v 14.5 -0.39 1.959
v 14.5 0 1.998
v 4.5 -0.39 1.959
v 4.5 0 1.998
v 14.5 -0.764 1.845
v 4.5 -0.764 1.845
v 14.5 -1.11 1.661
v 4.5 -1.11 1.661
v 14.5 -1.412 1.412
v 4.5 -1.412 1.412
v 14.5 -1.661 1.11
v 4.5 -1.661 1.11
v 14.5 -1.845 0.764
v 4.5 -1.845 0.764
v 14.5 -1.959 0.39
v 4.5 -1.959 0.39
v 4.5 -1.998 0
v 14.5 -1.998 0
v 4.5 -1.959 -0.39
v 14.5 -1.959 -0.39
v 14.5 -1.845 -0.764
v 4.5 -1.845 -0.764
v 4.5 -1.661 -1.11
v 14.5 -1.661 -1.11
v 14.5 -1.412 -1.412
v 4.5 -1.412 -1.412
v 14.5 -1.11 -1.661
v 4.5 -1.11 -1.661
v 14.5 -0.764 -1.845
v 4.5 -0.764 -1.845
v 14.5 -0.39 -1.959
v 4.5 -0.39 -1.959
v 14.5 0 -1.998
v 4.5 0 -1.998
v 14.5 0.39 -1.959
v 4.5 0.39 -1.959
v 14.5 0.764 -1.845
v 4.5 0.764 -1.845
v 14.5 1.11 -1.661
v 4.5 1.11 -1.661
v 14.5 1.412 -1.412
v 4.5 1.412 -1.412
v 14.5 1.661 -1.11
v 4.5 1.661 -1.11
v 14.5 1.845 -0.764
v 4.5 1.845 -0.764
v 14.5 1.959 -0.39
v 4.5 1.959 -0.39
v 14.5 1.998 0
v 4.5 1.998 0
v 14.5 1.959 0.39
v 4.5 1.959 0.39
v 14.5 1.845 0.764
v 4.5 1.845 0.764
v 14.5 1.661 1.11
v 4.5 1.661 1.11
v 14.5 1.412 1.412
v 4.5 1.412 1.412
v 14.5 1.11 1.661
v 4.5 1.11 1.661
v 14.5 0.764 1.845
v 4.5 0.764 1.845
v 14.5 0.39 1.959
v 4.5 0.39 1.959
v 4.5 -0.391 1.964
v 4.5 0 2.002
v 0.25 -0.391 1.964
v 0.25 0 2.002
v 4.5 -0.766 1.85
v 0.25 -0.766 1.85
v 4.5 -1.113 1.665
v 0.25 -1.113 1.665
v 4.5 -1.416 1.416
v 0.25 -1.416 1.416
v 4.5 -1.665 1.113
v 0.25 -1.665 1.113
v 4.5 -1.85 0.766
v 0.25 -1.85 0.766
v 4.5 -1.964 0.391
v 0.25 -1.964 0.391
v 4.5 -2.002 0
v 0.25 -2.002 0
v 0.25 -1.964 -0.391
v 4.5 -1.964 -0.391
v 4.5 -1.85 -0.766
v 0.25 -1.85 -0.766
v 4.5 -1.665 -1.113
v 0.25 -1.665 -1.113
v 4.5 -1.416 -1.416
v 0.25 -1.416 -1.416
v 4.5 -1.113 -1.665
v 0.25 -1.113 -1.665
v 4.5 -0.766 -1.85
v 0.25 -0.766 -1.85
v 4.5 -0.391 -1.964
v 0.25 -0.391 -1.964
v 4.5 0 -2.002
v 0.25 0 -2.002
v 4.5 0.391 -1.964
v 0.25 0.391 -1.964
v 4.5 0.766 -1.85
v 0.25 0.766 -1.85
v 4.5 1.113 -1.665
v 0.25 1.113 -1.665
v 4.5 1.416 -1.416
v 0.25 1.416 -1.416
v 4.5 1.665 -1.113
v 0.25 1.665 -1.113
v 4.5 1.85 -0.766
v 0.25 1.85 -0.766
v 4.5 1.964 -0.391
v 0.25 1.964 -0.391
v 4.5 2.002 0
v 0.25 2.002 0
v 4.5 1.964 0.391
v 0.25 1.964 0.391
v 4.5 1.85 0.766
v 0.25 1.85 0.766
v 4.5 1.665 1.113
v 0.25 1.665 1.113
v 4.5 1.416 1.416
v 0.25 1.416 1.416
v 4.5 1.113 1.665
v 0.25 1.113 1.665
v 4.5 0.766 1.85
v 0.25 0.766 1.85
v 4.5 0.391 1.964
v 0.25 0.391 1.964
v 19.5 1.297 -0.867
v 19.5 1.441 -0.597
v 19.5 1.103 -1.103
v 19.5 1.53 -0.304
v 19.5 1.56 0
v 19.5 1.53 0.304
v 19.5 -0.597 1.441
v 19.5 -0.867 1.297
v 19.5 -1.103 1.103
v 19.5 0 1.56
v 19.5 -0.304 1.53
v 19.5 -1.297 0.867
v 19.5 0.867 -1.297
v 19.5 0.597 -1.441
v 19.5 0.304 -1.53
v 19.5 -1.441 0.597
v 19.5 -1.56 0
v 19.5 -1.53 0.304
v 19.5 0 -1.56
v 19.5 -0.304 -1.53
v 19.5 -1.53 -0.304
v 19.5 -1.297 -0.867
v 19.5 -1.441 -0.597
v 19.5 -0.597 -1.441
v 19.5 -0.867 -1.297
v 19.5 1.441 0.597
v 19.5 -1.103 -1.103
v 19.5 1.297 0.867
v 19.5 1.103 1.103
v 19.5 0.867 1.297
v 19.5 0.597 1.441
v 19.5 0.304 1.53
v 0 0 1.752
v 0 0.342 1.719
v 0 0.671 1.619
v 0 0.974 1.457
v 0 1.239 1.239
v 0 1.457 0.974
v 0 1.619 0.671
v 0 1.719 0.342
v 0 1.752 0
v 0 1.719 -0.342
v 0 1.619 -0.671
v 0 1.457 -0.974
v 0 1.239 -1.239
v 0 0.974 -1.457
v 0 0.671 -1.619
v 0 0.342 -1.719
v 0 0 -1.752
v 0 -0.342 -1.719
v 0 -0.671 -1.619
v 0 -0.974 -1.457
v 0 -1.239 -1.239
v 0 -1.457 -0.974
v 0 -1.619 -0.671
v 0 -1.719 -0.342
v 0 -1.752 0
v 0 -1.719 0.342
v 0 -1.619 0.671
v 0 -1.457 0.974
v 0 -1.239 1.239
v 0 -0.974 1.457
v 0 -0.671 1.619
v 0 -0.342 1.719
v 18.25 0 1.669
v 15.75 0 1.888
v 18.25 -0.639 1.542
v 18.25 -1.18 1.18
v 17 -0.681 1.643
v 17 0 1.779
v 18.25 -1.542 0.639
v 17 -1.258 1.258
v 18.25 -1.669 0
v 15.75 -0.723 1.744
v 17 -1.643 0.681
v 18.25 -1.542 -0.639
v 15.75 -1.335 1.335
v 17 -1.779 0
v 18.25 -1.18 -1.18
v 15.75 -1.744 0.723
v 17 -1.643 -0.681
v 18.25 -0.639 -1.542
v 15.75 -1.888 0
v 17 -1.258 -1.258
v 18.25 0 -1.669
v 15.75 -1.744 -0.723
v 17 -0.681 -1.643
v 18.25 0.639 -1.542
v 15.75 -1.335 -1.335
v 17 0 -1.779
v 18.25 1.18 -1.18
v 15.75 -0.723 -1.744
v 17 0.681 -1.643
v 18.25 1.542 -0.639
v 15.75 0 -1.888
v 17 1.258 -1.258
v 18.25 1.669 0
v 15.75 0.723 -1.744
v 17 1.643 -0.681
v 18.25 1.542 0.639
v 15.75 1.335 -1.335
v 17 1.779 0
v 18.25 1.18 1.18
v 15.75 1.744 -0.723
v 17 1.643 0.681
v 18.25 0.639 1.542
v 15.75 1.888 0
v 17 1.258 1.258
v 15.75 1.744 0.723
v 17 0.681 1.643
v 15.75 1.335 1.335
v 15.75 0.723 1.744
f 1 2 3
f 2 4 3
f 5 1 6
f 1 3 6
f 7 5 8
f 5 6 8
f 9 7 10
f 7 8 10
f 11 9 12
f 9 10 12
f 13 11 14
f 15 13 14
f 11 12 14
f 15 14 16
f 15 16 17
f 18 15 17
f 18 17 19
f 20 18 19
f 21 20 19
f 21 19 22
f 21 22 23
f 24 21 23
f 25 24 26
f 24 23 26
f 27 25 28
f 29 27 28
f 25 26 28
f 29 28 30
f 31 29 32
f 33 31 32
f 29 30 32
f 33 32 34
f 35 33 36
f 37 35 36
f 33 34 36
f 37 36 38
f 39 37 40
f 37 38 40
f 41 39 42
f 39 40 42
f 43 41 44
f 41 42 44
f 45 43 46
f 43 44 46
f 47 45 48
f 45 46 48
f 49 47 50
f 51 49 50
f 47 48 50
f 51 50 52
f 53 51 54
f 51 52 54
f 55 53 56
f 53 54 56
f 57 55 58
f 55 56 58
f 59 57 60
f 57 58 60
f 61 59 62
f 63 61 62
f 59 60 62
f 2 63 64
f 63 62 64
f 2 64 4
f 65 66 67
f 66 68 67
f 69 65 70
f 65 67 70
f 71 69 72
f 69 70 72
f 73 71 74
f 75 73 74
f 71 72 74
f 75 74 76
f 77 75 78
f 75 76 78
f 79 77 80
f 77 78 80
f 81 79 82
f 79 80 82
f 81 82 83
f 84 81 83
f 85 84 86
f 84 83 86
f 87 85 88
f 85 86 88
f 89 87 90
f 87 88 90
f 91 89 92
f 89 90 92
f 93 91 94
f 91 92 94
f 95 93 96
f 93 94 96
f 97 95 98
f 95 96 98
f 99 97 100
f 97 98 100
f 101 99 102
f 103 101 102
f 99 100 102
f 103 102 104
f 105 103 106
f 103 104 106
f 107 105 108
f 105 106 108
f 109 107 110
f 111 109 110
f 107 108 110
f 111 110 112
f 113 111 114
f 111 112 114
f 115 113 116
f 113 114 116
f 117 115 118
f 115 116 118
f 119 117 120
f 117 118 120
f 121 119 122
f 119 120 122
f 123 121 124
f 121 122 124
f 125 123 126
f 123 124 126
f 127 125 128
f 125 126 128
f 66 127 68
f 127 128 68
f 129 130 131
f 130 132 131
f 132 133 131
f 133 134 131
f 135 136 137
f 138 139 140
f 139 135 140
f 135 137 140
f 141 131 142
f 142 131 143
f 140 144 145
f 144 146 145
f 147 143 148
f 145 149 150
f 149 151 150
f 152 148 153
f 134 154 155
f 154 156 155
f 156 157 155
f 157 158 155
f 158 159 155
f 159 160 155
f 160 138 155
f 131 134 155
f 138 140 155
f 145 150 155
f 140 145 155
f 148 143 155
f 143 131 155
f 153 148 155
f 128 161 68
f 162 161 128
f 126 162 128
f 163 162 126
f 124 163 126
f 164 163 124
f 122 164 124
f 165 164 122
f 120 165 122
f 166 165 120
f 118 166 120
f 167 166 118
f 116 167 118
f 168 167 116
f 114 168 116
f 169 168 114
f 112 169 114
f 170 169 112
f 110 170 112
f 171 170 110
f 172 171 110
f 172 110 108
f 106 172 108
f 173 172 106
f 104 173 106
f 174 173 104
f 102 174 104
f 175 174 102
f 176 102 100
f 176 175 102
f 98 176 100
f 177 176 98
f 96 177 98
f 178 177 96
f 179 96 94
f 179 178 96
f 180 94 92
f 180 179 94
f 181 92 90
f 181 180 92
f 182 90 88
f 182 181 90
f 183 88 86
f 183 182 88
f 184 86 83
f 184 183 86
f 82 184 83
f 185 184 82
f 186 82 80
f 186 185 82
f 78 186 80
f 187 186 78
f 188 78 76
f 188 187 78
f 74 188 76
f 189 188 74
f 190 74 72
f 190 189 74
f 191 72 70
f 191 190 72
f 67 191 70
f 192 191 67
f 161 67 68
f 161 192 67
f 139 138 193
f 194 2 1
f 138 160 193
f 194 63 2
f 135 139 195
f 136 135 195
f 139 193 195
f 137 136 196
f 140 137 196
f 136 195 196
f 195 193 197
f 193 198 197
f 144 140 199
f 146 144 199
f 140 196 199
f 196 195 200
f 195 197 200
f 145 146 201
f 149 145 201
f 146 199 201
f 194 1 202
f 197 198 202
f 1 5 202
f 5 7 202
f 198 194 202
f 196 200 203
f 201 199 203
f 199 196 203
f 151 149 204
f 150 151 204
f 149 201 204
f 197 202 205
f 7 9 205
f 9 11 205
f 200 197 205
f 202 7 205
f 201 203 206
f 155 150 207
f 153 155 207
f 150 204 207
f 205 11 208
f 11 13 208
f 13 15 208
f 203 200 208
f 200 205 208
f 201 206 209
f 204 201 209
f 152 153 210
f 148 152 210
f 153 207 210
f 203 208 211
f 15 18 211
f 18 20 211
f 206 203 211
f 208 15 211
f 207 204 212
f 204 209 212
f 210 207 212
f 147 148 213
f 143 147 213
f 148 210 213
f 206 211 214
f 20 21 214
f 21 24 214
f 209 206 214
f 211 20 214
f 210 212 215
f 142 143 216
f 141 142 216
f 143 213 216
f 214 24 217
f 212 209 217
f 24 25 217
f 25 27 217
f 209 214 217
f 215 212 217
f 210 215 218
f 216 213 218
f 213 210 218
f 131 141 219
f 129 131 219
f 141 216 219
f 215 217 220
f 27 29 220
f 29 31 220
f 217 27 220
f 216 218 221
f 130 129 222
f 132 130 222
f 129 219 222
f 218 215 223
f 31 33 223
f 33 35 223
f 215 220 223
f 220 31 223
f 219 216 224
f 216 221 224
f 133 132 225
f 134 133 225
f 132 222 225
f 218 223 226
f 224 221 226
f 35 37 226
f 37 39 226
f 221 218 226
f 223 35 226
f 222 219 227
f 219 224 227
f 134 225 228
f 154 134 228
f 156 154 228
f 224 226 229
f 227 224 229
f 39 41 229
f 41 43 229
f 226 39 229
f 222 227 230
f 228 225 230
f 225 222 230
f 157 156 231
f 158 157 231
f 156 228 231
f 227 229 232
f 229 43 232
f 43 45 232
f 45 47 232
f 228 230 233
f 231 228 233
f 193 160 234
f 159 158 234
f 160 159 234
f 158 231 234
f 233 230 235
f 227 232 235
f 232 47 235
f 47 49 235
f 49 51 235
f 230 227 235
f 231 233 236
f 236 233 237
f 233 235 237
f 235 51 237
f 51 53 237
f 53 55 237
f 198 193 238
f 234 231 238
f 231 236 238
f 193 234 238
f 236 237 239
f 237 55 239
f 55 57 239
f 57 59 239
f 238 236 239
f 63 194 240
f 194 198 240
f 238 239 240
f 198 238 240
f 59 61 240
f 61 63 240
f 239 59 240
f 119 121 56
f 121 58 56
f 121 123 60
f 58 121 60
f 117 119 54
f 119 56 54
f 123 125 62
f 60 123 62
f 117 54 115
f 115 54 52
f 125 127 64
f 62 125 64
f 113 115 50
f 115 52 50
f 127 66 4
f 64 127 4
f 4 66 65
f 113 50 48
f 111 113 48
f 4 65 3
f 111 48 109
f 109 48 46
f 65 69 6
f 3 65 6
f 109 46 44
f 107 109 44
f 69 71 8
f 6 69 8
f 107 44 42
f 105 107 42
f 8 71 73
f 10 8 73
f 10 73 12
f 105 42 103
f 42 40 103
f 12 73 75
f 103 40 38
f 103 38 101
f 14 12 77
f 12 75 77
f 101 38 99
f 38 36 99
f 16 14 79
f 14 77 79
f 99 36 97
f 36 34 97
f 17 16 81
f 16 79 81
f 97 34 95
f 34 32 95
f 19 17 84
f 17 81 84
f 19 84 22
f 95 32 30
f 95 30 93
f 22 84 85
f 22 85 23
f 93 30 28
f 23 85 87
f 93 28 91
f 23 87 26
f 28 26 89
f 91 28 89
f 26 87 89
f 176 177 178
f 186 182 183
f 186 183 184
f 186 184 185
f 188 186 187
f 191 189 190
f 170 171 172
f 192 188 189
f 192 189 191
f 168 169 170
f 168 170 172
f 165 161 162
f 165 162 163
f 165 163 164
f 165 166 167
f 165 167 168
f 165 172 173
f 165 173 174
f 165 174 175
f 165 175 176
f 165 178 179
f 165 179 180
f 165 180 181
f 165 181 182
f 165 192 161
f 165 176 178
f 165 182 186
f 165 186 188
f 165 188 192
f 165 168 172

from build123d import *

# Parameters (mm, degrees)
FILLET1_R = 0.25


with BuildPart() as part:
    # Sketch1 → Revolve1 (revolve)
    with BuildSketch(Plane.XY, mode=Mode.PRIVATE) as revolve1_sk:
        Polygon((0, 2.0025), (0, 3.5), (-1, 3.5), (-1, 0), (19.5, 0), (19.5, 1.560056682), (14.5, 1.9975), (4.5, 1.9975), (4.5, 2.0025), align=None)
    revolve(revolve1_sk.sketch.rotate(Axis((-30.167084044, 0, 0), (1, 0, 0)), 90), axis=Axis((-30.167084044, 0, 0), (1, 0, 0)))  # turned: the seam where the file's is

    # Fillet1
    fillet1_edges = [part.edges().sort_by_distance(p)[0] for p in [
        (0, 0, -2.0025),
    ]]
    fillet(fillet1_edges, radius=FILLET1_R)

    # Sketch2 → Cut-Revolve1 (revolve, cut)
    with BuildSketch(Plane.XY, mode=Mode.PRIVATE) as cut_revolve1_sk:
        Polygon((0.25, 2.0025), (0, 1.7525), (0, 0), (-1, 0), (-1, 3.5), (0, 3.5), align=None)
    revolve(cut_revolve1_sk.sketch.rotate(Axis((0, 0, 0), (-1, 0, 0)), 270), axis=Axis((0, 0, 0), (-1, 0, 0)), mode=Mode.SUBTRACT)  # turned: the seam where the file's is


solid = part.part
